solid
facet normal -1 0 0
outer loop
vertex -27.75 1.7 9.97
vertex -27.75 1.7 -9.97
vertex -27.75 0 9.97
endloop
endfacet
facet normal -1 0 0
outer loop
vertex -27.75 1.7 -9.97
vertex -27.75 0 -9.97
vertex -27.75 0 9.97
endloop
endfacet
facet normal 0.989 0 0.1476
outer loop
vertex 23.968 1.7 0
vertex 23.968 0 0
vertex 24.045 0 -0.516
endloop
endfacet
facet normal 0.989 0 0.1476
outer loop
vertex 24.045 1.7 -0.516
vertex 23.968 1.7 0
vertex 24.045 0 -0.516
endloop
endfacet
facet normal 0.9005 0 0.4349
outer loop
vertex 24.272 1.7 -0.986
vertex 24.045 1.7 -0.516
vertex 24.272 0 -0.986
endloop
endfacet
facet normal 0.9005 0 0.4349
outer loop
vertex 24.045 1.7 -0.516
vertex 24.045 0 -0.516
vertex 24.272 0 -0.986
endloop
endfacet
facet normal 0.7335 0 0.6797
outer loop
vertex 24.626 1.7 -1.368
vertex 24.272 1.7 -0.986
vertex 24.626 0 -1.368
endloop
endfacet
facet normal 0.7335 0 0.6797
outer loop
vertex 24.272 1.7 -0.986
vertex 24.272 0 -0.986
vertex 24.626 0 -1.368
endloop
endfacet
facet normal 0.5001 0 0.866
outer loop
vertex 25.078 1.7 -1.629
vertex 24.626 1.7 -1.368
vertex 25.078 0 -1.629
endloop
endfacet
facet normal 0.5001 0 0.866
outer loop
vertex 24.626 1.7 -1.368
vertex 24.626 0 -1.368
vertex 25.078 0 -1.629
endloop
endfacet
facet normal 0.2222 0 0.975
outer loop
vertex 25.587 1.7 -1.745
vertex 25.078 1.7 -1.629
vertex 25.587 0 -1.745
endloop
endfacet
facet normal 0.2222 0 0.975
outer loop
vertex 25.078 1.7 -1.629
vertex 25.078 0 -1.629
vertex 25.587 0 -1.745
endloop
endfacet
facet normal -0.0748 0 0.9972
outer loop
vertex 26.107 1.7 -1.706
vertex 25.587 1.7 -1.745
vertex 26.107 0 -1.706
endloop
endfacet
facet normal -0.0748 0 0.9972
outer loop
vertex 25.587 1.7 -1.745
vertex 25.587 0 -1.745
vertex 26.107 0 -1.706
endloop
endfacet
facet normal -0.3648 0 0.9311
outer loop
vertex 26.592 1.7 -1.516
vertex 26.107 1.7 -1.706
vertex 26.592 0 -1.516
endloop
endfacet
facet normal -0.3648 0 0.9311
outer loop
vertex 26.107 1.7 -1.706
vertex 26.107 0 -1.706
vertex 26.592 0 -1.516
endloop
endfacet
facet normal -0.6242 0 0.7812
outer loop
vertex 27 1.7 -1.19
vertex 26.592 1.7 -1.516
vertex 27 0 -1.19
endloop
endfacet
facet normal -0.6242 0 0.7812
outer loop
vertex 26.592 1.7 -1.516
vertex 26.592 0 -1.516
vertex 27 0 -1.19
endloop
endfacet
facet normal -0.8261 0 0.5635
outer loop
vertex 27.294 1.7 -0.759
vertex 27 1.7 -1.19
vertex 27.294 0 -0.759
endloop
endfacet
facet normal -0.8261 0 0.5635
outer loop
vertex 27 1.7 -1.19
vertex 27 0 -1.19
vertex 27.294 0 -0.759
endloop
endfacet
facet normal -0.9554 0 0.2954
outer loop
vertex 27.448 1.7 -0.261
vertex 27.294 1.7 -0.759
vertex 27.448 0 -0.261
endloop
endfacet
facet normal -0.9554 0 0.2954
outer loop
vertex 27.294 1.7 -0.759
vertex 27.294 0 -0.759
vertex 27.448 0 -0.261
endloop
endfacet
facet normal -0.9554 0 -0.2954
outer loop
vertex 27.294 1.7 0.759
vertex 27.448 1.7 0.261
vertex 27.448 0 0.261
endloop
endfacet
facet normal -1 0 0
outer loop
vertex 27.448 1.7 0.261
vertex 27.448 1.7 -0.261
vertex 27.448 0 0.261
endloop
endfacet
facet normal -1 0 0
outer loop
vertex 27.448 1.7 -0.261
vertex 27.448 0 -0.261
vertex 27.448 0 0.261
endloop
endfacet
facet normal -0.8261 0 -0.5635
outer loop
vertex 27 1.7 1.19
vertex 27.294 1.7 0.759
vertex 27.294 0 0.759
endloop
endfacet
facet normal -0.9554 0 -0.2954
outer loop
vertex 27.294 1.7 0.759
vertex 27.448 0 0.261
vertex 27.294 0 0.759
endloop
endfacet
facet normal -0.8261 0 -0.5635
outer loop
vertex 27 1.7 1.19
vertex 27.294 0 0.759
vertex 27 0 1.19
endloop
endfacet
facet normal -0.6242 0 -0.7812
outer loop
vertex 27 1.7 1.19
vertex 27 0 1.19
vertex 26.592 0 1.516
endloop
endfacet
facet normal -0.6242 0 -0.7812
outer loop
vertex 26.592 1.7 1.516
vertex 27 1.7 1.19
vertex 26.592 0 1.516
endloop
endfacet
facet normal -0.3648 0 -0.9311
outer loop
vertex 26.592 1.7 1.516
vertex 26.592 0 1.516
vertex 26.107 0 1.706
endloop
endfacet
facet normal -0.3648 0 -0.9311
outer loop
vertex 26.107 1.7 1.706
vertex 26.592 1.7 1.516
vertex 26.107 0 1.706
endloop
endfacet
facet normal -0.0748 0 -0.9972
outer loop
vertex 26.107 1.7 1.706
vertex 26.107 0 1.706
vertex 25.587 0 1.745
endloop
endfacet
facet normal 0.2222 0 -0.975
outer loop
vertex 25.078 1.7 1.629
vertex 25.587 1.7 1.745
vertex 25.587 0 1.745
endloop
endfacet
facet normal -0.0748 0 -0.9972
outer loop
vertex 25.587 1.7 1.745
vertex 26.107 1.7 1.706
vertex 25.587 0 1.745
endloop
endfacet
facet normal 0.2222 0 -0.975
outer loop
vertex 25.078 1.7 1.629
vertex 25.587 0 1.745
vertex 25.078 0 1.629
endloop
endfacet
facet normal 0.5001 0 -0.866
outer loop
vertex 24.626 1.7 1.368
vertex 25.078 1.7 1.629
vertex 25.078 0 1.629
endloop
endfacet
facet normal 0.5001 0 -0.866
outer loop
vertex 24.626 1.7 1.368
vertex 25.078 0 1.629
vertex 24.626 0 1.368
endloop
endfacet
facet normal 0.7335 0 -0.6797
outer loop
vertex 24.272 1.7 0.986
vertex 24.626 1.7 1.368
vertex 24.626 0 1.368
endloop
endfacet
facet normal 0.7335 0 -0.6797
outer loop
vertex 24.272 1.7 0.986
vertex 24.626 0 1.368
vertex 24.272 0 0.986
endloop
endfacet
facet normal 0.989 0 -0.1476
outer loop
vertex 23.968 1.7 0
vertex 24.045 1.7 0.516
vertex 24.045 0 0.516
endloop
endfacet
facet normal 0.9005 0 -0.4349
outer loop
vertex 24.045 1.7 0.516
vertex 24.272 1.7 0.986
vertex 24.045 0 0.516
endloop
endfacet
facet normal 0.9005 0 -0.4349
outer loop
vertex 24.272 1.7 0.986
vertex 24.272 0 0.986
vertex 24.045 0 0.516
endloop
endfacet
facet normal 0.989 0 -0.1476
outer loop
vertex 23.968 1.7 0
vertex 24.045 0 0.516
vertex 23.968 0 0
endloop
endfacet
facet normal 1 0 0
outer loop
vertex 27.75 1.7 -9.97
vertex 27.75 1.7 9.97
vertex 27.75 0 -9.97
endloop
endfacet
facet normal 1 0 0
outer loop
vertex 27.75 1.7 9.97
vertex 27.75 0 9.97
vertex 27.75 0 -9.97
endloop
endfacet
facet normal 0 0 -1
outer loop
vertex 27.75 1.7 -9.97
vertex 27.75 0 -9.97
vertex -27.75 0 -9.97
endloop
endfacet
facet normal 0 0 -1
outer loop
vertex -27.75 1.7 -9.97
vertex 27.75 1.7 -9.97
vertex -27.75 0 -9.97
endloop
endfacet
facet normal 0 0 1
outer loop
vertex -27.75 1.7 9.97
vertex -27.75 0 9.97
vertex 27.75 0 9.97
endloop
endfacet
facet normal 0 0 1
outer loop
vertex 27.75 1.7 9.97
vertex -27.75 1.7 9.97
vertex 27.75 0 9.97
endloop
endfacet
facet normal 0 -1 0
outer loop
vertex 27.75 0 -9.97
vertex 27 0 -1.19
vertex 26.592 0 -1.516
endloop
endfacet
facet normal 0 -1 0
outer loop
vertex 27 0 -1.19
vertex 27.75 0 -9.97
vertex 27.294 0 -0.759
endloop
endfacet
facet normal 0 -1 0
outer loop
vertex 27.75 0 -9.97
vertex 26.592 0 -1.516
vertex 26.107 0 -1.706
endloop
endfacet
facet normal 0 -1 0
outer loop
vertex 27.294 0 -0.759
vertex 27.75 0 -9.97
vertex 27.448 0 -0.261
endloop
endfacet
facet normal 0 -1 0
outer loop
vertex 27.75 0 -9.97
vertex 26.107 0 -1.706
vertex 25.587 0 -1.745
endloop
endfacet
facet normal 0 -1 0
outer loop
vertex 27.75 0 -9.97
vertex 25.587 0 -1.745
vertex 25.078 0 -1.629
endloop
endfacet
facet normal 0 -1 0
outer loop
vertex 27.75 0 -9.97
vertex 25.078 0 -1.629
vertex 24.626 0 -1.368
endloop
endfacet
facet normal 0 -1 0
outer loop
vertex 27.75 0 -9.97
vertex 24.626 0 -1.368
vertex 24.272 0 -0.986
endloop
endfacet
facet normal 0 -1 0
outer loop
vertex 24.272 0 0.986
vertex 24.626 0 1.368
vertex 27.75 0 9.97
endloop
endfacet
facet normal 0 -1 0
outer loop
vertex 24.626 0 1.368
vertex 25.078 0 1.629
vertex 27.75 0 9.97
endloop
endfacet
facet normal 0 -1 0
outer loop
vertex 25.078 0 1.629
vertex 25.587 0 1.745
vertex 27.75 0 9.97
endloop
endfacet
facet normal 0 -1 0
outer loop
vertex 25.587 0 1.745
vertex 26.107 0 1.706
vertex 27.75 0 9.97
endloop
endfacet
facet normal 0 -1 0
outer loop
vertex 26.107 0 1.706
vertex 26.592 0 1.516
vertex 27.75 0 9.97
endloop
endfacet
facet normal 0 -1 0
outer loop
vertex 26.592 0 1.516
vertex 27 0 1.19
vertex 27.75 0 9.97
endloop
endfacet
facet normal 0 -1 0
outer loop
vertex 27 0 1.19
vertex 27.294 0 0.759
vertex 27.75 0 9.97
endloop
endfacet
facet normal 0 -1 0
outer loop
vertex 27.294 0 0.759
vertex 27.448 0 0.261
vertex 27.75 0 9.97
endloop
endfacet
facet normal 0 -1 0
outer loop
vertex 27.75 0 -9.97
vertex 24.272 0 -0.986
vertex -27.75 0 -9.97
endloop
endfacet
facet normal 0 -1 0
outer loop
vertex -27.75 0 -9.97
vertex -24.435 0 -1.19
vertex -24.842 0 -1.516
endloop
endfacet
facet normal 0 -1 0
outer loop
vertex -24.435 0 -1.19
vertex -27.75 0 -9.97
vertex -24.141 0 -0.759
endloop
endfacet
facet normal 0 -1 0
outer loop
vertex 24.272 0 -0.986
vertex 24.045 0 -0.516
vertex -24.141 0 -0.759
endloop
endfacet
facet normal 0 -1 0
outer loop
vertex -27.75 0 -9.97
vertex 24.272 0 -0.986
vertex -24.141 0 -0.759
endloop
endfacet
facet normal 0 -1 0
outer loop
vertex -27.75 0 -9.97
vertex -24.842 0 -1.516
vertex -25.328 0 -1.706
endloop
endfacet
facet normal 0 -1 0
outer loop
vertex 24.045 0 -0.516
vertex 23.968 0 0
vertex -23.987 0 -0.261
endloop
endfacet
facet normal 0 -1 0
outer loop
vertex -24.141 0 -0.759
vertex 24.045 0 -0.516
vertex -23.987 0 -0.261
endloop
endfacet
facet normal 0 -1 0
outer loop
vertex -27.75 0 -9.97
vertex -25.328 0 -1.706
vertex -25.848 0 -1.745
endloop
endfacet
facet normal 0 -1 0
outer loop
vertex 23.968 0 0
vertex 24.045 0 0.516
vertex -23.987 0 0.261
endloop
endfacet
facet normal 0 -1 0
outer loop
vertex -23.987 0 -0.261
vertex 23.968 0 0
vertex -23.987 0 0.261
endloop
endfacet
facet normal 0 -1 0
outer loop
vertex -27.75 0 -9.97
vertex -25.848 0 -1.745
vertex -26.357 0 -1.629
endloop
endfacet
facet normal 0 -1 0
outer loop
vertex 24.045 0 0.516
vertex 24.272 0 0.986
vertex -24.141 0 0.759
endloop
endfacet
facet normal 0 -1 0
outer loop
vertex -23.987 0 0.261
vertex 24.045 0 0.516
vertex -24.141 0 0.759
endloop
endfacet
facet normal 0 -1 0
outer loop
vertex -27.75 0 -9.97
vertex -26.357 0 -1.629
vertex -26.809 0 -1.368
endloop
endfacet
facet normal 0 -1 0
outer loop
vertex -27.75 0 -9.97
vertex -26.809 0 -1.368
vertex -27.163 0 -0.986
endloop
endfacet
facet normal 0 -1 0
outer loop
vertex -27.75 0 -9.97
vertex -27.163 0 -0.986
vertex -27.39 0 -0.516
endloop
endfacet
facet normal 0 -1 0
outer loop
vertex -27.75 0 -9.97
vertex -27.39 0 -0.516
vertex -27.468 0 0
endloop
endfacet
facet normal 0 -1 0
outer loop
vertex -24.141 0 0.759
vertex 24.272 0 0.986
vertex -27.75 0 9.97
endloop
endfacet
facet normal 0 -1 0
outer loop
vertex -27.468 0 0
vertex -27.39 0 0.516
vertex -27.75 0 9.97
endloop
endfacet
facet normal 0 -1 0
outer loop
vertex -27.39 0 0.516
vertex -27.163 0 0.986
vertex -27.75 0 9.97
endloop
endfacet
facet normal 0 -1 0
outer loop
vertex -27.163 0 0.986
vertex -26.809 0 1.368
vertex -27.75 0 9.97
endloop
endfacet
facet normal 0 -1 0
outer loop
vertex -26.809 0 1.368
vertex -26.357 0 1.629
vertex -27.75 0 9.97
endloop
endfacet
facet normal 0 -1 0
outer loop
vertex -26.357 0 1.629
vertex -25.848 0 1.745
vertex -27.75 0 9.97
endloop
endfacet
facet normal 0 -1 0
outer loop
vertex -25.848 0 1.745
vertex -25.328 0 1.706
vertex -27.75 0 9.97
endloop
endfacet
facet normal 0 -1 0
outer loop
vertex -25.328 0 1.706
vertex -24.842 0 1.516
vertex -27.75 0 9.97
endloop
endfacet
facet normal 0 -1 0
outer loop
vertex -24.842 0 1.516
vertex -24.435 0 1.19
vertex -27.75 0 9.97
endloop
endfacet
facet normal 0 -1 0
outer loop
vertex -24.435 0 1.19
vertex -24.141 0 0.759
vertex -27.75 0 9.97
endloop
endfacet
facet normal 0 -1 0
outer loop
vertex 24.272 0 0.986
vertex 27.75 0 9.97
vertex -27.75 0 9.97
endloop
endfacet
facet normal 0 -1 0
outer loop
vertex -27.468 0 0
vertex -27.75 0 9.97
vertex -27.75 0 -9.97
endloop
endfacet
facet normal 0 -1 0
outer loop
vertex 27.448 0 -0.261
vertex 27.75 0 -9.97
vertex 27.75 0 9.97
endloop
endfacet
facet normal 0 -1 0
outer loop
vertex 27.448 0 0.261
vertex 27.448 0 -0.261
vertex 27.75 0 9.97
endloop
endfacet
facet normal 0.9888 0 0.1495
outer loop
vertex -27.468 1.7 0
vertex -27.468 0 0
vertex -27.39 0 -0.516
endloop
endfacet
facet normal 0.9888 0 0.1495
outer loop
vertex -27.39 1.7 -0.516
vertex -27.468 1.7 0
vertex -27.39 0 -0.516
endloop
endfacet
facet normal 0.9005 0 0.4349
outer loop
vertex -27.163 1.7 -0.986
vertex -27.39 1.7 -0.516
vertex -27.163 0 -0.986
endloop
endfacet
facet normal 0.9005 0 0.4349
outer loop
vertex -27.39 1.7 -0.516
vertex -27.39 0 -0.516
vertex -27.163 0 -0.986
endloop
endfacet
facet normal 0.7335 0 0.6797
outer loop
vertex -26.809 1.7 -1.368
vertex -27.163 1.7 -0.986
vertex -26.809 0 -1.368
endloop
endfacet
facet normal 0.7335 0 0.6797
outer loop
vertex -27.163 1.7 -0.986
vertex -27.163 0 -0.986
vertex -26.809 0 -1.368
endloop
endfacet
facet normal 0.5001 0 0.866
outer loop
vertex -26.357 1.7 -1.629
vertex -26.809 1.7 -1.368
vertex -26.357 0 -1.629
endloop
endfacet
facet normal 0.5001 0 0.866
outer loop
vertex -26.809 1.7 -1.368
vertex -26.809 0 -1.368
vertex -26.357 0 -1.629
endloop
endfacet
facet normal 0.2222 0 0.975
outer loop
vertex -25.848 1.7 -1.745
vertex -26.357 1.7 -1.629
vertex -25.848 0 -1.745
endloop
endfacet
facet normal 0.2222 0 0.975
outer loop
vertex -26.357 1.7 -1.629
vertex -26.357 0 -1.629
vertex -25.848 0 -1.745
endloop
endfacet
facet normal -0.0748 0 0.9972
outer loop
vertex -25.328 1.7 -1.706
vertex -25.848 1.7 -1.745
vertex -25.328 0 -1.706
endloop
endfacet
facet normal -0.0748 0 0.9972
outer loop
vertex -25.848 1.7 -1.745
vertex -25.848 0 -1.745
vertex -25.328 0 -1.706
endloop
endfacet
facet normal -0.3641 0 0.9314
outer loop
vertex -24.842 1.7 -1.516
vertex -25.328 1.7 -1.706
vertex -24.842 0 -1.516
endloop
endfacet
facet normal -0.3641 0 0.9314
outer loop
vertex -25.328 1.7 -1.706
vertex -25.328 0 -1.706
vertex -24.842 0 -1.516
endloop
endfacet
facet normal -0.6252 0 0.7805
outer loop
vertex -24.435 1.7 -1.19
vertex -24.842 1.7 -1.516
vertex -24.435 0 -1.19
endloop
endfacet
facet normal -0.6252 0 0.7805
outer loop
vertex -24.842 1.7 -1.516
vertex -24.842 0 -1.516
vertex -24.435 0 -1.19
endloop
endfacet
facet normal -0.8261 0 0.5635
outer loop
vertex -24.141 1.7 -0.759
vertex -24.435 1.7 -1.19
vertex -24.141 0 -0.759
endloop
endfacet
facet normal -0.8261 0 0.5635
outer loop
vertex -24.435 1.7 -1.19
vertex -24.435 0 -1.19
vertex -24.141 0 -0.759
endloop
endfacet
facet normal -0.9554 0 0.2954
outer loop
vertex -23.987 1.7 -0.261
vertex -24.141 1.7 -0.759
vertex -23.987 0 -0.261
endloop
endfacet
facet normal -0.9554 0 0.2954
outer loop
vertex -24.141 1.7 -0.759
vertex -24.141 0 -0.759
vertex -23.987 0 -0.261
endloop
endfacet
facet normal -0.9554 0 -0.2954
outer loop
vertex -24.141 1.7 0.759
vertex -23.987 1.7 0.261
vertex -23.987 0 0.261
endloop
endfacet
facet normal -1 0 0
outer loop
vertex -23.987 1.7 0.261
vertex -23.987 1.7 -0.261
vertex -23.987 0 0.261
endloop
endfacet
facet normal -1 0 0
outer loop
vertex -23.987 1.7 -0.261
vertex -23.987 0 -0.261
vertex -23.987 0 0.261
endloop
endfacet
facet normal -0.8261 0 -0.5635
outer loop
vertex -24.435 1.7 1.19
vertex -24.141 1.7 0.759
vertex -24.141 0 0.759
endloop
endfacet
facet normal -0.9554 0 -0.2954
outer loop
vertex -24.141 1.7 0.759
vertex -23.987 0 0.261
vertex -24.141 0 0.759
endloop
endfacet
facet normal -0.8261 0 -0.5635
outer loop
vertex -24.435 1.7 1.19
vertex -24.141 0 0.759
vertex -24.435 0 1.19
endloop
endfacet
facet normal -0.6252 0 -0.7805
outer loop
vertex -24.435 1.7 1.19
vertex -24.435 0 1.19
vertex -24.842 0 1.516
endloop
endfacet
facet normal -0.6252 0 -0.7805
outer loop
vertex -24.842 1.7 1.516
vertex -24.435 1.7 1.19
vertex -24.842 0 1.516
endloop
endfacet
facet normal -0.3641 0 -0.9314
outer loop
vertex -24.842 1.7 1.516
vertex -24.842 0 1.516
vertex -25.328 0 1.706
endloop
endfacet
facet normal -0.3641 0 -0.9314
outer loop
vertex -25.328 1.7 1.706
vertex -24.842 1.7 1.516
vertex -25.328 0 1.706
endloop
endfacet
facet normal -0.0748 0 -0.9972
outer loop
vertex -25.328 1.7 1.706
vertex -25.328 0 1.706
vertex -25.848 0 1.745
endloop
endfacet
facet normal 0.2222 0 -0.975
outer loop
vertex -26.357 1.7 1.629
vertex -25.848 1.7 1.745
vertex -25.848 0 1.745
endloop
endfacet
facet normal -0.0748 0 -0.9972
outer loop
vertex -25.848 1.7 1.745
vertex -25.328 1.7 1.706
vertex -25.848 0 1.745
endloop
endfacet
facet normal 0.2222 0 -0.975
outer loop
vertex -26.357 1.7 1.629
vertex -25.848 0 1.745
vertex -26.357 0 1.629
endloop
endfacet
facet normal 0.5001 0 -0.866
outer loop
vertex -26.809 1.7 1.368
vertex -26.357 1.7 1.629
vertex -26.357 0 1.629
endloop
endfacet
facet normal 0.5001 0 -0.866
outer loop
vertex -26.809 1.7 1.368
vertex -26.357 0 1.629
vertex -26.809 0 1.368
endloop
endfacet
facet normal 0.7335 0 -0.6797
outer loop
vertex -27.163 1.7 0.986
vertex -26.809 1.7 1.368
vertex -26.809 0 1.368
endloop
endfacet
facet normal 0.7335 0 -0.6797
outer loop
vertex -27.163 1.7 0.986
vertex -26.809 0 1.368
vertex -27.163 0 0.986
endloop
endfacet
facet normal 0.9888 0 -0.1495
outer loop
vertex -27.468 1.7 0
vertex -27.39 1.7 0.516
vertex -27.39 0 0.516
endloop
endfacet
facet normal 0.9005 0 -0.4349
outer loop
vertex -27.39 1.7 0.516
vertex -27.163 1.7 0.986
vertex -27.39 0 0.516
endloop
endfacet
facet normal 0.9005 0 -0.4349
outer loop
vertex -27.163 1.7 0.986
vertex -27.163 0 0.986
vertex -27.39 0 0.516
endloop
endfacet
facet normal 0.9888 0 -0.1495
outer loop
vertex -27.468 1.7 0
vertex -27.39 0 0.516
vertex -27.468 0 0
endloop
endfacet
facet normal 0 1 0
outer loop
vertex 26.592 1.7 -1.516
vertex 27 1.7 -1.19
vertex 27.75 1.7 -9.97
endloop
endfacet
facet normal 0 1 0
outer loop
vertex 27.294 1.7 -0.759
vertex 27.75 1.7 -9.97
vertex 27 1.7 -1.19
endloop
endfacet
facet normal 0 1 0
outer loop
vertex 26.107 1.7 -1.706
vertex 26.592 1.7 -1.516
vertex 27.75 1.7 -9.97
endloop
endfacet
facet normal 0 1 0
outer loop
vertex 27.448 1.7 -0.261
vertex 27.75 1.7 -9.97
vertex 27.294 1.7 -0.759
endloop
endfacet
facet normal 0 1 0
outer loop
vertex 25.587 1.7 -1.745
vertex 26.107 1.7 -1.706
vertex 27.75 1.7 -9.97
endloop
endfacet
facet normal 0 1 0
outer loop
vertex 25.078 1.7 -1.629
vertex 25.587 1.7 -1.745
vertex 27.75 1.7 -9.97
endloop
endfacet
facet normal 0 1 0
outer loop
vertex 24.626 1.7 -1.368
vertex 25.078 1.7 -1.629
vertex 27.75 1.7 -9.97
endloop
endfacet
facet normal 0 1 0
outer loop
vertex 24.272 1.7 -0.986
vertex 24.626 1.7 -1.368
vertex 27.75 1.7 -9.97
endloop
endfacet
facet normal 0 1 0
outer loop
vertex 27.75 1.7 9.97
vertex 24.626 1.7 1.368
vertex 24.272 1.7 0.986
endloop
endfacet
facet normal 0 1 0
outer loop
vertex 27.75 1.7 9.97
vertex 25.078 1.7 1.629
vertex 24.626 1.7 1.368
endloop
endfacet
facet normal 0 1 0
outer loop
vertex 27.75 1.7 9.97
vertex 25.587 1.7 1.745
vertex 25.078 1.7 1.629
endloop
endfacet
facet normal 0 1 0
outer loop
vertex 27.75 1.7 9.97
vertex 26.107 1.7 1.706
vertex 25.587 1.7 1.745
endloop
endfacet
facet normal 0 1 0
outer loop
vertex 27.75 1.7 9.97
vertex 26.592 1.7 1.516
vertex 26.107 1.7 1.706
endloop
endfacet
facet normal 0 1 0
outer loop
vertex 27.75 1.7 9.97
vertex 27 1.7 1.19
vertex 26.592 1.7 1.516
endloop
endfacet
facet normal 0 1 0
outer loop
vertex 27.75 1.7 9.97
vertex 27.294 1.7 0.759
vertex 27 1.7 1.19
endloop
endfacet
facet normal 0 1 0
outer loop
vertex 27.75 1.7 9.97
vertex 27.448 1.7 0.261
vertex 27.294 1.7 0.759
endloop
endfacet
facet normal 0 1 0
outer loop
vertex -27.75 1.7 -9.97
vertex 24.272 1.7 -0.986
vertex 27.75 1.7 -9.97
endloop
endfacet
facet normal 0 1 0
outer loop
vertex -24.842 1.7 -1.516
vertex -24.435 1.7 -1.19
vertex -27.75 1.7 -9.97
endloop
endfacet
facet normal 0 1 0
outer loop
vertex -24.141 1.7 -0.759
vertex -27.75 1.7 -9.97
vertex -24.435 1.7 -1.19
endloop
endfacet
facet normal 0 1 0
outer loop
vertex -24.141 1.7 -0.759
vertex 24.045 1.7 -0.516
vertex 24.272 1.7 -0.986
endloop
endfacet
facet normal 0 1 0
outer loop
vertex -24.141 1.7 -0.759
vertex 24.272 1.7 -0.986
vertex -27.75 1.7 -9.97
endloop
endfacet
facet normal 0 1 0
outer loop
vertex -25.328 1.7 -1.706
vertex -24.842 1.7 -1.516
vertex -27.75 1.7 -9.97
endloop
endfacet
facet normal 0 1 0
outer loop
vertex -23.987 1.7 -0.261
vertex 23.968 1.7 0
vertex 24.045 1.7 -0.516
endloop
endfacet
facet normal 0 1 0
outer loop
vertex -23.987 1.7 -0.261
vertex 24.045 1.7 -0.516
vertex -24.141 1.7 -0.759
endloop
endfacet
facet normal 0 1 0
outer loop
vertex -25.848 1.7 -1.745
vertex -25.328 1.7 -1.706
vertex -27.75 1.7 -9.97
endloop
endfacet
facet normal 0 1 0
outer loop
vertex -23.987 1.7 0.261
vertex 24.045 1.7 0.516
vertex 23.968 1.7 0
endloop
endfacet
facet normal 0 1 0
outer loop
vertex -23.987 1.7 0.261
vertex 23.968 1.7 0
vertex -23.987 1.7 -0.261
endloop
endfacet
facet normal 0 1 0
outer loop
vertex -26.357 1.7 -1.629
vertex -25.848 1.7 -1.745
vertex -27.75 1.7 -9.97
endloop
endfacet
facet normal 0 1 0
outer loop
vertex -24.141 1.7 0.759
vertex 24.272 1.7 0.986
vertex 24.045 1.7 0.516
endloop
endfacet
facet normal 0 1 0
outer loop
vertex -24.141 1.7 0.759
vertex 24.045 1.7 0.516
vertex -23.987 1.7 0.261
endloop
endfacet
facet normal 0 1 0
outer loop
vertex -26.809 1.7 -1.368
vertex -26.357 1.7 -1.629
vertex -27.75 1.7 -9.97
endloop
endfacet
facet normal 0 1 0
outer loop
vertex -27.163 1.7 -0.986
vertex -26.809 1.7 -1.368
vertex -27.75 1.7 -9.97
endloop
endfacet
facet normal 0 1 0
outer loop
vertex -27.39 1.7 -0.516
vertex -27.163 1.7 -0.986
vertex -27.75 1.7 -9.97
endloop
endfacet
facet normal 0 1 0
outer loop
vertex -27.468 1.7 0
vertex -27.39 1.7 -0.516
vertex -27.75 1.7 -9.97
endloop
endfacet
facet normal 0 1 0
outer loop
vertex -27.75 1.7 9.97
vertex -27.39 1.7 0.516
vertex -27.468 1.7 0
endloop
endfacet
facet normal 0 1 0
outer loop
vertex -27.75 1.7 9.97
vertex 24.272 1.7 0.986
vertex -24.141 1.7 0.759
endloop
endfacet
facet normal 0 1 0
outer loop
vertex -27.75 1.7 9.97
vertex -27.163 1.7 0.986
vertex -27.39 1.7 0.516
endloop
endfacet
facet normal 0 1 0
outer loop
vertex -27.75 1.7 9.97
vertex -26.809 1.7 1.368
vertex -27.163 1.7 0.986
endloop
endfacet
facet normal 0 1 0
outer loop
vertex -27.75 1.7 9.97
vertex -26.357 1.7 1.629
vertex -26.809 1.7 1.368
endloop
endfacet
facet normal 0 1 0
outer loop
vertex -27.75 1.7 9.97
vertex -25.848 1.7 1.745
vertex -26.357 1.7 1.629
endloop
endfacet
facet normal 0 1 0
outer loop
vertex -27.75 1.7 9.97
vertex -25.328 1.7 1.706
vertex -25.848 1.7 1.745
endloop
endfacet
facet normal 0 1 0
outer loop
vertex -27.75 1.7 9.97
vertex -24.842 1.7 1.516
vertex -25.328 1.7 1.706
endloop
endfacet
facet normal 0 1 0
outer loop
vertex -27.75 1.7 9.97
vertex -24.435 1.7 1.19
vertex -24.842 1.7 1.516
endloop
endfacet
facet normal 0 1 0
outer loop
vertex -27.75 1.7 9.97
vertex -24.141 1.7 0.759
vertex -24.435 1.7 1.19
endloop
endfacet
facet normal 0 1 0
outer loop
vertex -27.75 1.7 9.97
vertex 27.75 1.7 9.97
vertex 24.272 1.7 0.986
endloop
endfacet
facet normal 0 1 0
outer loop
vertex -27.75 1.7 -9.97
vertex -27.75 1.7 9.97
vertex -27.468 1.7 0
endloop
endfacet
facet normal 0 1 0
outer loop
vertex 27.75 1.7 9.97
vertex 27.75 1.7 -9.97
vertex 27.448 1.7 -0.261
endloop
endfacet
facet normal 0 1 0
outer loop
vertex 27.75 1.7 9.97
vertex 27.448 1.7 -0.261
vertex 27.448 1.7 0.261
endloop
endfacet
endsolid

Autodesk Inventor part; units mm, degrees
ref_plane "YZ Plane" through (0, 0, 0) normal (1, 0, 0) x (0, 1, 0)
ref_plane "XZ Plane" through (0, 0, 0) normal (0, 1, 0) x (-1, 0, 0)
ref_plane "XY Plane" through (0, 0, 0) normal (0, 0, 1) x (1, 0, 0)
sketch "Sketch1" plane through (0, 0, 0) normal (0, 1, 0) x (-1, 0, 0)
  line L0 (27.7495, 9.9695) -> (-27.7495, 9.9695)
  line L1 (-27.7495, 9.9695) -> (-27.7495, -9.9695)
  line L2 (-27.7495, -9.9695) -> (27.7495, -9.9695)
  line L3 (27.7495, -9.9695) -> (27.7495, 9.9695)
  line L4 (27.7495, 9.9695) -> (-27.7495, -9.9695) construction
  line L5 (-27.7495, 9.9695) -> (27.7495, -9.9695) construction
  circle A0 centre (25.7175, 0) radius 1.75
  circle A1 centre (-25.7175, 0) radius 1.75
  point P0 (0, 0)
  dimension "d0" = 55.499
  dimension "d1" = 19.939
  dimension "d2" = 3.5
  dimension "d3" = 3.5
  dimension "d4" = 2.032
  dimension "d5" = 2.032
extrude "Extrusion1" add sketch "Sketch1" along normal blind 1.7
sketch "Sketch2" plane through (0, 1.7, 0) normal (0, 1, 0) x (1, 0, 0)
  circle A0 centre (25.7175, 0) radius 1.75 projected
  circle A1 centre (-25.7175, 0) radius 1.75 projected
  line L0 (-27.7495, -9.9695) -> (27.7495, -9.9695) projected
  line L1 (27.7495, -9.9695) -> (27.7495, 9.9695) projected
  line L2 (27.7495, 9.9695) -> (-27.7495, 9.9695) projected
  line L3 (-27.7495, 9.9695) -> (-27.7495, -9.9695) projected
  line L4 (16.1881, -1.9444) -> (-16.645, -1.9444) construction
  line L5 (-16.645, -1.9444) -> (-16.645, 1.7031) construction
  line L6 (-16.645, 1.7031) -> (16.1881, 1.7031) construction
  line L7 (16.1881, 1.7031) -> (16.1881, -1.9444) construction
  point P0 (0, 0)
properties part number "Start Stop"
